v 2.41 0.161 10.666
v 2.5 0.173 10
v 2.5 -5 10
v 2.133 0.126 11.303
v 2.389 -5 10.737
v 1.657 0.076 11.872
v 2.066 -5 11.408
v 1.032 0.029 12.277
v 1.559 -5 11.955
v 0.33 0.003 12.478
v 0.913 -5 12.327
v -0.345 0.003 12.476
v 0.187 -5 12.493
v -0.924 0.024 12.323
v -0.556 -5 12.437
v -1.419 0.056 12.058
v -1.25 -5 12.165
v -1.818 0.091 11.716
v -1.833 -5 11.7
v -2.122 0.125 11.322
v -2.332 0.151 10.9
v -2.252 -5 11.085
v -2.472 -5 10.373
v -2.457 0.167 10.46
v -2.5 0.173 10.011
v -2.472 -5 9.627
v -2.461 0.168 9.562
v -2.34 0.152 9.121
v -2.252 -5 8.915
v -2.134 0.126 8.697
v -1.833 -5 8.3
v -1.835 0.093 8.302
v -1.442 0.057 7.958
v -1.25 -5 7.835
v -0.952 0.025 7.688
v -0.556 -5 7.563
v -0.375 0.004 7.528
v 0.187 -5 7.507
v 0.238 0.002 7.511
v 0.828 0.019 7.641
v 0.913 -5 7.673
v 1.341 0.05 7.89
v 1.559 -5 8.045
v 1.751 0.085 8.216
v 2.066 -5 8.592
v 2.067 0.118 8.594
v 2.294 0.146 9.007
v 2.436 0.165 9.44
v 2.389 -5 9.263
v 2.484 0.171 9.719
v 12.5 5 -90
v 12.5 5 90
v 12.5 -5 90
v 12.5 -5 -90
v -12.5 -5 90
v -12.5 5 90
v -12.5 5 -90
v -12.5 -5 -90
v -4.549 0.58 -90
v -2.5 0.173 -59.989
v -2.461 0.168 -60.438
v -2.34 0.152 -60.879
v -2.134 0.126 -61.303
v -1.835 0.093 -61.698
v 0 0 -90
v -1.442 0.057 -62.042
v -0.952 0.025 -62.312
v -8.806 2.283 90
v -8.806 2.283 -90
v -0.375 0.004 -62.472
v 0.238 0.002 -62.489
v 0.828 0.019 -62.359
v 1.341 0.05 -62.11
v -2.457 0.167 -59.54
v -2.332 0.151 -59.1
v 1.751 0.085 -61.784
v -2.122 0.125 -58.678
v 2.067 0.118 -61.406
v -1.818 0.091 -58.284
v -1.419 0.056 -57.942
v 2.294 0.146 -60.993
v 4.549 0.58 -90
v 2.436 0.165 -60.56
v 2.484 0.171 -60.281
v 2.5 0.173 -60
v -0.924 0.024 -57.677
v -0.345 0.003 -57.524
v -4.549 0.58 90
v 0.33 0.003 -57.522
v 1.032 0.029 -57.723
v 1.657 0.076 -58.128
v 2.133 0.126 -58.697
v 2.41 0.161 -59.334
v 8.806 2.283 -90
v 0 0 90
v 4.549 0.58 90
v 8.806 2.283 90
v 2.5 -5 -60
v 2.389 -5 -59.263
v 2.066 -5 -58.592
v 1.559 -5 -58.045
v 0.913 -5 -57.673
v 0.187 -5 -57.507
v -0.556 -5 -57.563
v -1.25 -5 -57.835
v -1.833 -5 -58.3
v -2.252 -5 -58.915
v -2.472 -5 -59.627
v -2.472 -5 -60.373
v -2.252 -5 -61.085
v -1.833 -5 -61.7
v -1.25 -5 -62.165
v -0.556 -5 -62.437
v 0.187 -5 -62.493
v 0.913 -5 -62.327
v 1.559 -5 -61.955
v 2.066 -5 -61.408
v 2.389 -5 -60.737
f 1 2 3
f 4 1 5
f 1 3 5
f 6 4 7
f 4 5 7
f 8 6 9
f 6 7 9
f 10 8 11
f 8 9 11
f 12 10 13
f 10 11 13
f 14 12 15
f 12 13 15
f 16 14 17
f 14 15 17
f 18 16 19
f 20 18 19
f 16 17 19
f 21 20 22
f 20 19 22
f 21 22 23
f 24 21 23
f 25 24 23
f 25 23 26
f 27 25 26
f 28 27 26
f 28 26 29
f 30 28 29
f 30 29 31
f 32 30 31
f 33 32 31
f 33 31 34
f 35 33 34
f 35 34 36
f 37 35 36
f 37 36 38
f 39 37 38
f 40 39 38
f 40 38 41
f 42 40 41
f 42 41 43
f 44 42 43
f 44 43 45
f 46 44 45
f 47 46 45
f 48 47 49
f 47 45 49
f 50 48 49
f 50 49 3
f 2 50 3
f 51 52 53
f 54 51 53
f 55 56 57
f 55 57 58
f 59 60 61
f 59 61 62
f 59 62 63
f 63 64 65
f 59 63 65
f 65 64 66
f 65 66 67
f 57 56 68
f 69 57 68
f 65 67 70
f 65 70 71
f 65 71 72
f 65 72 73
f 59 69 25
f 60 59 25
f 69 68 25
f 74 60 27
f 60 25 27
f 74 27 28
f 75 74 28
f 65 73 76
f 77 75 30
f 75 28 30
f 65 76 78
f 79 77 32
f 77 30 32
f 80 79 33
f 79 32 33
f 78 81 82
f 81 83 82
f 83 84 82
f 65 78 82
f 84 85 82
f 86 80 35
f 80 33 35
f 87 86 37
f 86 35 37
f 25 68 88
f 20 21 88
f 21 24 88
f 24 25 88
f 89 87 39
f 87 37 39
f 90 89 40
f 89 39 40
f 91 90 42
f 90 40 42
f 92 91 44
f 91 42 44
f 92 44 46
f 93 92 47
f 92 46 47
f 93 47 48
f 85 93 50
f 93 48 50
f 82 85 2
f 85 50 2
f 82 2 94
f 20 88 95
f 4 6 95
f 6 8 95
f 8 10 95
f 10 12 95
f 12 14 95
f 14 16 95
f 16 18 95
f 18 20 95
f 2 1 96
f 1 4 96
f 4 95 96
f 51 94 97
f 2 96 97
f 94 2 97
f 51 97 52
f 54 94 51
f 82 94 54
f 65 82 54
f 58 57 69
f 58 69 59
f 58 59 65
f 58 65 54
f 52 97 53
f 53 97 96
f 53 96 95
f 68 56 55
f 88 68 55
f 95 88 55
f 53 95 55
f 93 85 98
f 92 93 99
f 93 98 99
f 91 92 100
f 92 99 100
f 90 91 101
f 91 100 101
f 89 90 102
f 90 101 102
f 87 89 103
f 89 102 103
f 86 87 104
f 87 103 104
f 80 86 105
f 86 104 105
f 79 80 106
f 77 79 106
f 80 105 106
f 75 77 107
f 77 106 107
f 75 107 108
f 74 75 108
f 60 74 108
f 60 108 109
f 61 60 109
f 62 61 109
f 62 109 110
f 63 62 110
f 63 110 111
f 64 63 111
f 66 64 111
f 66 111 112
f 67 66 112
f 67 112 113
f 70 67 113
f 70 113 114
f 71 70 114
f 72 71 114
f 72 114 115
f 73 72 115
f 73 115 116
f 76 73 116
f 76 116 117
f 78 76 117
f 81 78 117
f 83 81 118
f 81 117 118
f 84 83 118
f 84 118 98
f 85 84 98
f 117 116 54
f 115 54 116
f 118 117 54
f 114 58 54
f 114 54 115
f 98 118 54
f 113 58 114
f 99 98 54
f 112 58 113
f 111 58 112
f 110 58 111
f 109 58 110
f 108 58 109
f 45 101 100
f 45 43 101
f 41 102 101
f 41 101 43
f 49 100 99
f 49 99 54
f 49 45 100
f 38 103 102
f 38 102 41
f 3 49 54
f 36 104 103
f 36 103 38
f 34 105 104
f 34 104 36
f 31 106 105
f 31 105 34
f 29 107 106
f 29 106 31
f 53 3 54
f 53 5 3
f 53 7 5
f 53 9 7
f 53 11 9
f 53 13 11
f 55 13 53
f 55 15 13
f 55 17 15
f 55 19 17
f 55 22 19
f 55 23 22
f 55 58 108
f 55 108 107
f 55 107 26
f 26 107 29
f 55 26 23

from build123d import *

# Parameters (mm, degrees)
F0_W     = 10
F0_H     = 180
F1_DEPTH = 12.5
F3_DEPTH = 180.001
F5_ANGLE = 90
F6_R     = 2.5
F7_DEPTH = 10.001


with BuildPart() as f1:
    # F0 (on Front) → F1 (new body, symmetric)
    with BuildSketch(Plane.XZ):
        Rectangle(F0_W, F0_H)
    extrude(amount=F1_DEPTH, both=True)

    # F2 (on face) → F3 (cut, through all)
    with BuildSketch(Plane.XY.offset(90)):
        with BuildLine():
            Line((-5, 12.5), (-5, -12.5))
            ThreePointArc((-5, -12.5), (0, 0), (-5, 12.5))
        make_face()
    extrude(amount=-F3_DEPTH, mode=Mode.SUBTRACT)


with BuildPart() as f1_1:
    # F5: moved
    add(f1.part.rotate(Axis((0, 0, 28.159656), (0, 0, -1)), F5_ANGLE))

    # F6 (on face) → F7 (cut, through all)
    with BuildSketch(Plane.XZ.offset(5)):
        with Locations((0, 10)):
            Circle(F6_R)
        with Locations((0, -60)):
            Circle(F6_R)
    extrude(amount=-F7_DEPTH, mode=Mode.SUBTRACT)


solid = f1_1.part
